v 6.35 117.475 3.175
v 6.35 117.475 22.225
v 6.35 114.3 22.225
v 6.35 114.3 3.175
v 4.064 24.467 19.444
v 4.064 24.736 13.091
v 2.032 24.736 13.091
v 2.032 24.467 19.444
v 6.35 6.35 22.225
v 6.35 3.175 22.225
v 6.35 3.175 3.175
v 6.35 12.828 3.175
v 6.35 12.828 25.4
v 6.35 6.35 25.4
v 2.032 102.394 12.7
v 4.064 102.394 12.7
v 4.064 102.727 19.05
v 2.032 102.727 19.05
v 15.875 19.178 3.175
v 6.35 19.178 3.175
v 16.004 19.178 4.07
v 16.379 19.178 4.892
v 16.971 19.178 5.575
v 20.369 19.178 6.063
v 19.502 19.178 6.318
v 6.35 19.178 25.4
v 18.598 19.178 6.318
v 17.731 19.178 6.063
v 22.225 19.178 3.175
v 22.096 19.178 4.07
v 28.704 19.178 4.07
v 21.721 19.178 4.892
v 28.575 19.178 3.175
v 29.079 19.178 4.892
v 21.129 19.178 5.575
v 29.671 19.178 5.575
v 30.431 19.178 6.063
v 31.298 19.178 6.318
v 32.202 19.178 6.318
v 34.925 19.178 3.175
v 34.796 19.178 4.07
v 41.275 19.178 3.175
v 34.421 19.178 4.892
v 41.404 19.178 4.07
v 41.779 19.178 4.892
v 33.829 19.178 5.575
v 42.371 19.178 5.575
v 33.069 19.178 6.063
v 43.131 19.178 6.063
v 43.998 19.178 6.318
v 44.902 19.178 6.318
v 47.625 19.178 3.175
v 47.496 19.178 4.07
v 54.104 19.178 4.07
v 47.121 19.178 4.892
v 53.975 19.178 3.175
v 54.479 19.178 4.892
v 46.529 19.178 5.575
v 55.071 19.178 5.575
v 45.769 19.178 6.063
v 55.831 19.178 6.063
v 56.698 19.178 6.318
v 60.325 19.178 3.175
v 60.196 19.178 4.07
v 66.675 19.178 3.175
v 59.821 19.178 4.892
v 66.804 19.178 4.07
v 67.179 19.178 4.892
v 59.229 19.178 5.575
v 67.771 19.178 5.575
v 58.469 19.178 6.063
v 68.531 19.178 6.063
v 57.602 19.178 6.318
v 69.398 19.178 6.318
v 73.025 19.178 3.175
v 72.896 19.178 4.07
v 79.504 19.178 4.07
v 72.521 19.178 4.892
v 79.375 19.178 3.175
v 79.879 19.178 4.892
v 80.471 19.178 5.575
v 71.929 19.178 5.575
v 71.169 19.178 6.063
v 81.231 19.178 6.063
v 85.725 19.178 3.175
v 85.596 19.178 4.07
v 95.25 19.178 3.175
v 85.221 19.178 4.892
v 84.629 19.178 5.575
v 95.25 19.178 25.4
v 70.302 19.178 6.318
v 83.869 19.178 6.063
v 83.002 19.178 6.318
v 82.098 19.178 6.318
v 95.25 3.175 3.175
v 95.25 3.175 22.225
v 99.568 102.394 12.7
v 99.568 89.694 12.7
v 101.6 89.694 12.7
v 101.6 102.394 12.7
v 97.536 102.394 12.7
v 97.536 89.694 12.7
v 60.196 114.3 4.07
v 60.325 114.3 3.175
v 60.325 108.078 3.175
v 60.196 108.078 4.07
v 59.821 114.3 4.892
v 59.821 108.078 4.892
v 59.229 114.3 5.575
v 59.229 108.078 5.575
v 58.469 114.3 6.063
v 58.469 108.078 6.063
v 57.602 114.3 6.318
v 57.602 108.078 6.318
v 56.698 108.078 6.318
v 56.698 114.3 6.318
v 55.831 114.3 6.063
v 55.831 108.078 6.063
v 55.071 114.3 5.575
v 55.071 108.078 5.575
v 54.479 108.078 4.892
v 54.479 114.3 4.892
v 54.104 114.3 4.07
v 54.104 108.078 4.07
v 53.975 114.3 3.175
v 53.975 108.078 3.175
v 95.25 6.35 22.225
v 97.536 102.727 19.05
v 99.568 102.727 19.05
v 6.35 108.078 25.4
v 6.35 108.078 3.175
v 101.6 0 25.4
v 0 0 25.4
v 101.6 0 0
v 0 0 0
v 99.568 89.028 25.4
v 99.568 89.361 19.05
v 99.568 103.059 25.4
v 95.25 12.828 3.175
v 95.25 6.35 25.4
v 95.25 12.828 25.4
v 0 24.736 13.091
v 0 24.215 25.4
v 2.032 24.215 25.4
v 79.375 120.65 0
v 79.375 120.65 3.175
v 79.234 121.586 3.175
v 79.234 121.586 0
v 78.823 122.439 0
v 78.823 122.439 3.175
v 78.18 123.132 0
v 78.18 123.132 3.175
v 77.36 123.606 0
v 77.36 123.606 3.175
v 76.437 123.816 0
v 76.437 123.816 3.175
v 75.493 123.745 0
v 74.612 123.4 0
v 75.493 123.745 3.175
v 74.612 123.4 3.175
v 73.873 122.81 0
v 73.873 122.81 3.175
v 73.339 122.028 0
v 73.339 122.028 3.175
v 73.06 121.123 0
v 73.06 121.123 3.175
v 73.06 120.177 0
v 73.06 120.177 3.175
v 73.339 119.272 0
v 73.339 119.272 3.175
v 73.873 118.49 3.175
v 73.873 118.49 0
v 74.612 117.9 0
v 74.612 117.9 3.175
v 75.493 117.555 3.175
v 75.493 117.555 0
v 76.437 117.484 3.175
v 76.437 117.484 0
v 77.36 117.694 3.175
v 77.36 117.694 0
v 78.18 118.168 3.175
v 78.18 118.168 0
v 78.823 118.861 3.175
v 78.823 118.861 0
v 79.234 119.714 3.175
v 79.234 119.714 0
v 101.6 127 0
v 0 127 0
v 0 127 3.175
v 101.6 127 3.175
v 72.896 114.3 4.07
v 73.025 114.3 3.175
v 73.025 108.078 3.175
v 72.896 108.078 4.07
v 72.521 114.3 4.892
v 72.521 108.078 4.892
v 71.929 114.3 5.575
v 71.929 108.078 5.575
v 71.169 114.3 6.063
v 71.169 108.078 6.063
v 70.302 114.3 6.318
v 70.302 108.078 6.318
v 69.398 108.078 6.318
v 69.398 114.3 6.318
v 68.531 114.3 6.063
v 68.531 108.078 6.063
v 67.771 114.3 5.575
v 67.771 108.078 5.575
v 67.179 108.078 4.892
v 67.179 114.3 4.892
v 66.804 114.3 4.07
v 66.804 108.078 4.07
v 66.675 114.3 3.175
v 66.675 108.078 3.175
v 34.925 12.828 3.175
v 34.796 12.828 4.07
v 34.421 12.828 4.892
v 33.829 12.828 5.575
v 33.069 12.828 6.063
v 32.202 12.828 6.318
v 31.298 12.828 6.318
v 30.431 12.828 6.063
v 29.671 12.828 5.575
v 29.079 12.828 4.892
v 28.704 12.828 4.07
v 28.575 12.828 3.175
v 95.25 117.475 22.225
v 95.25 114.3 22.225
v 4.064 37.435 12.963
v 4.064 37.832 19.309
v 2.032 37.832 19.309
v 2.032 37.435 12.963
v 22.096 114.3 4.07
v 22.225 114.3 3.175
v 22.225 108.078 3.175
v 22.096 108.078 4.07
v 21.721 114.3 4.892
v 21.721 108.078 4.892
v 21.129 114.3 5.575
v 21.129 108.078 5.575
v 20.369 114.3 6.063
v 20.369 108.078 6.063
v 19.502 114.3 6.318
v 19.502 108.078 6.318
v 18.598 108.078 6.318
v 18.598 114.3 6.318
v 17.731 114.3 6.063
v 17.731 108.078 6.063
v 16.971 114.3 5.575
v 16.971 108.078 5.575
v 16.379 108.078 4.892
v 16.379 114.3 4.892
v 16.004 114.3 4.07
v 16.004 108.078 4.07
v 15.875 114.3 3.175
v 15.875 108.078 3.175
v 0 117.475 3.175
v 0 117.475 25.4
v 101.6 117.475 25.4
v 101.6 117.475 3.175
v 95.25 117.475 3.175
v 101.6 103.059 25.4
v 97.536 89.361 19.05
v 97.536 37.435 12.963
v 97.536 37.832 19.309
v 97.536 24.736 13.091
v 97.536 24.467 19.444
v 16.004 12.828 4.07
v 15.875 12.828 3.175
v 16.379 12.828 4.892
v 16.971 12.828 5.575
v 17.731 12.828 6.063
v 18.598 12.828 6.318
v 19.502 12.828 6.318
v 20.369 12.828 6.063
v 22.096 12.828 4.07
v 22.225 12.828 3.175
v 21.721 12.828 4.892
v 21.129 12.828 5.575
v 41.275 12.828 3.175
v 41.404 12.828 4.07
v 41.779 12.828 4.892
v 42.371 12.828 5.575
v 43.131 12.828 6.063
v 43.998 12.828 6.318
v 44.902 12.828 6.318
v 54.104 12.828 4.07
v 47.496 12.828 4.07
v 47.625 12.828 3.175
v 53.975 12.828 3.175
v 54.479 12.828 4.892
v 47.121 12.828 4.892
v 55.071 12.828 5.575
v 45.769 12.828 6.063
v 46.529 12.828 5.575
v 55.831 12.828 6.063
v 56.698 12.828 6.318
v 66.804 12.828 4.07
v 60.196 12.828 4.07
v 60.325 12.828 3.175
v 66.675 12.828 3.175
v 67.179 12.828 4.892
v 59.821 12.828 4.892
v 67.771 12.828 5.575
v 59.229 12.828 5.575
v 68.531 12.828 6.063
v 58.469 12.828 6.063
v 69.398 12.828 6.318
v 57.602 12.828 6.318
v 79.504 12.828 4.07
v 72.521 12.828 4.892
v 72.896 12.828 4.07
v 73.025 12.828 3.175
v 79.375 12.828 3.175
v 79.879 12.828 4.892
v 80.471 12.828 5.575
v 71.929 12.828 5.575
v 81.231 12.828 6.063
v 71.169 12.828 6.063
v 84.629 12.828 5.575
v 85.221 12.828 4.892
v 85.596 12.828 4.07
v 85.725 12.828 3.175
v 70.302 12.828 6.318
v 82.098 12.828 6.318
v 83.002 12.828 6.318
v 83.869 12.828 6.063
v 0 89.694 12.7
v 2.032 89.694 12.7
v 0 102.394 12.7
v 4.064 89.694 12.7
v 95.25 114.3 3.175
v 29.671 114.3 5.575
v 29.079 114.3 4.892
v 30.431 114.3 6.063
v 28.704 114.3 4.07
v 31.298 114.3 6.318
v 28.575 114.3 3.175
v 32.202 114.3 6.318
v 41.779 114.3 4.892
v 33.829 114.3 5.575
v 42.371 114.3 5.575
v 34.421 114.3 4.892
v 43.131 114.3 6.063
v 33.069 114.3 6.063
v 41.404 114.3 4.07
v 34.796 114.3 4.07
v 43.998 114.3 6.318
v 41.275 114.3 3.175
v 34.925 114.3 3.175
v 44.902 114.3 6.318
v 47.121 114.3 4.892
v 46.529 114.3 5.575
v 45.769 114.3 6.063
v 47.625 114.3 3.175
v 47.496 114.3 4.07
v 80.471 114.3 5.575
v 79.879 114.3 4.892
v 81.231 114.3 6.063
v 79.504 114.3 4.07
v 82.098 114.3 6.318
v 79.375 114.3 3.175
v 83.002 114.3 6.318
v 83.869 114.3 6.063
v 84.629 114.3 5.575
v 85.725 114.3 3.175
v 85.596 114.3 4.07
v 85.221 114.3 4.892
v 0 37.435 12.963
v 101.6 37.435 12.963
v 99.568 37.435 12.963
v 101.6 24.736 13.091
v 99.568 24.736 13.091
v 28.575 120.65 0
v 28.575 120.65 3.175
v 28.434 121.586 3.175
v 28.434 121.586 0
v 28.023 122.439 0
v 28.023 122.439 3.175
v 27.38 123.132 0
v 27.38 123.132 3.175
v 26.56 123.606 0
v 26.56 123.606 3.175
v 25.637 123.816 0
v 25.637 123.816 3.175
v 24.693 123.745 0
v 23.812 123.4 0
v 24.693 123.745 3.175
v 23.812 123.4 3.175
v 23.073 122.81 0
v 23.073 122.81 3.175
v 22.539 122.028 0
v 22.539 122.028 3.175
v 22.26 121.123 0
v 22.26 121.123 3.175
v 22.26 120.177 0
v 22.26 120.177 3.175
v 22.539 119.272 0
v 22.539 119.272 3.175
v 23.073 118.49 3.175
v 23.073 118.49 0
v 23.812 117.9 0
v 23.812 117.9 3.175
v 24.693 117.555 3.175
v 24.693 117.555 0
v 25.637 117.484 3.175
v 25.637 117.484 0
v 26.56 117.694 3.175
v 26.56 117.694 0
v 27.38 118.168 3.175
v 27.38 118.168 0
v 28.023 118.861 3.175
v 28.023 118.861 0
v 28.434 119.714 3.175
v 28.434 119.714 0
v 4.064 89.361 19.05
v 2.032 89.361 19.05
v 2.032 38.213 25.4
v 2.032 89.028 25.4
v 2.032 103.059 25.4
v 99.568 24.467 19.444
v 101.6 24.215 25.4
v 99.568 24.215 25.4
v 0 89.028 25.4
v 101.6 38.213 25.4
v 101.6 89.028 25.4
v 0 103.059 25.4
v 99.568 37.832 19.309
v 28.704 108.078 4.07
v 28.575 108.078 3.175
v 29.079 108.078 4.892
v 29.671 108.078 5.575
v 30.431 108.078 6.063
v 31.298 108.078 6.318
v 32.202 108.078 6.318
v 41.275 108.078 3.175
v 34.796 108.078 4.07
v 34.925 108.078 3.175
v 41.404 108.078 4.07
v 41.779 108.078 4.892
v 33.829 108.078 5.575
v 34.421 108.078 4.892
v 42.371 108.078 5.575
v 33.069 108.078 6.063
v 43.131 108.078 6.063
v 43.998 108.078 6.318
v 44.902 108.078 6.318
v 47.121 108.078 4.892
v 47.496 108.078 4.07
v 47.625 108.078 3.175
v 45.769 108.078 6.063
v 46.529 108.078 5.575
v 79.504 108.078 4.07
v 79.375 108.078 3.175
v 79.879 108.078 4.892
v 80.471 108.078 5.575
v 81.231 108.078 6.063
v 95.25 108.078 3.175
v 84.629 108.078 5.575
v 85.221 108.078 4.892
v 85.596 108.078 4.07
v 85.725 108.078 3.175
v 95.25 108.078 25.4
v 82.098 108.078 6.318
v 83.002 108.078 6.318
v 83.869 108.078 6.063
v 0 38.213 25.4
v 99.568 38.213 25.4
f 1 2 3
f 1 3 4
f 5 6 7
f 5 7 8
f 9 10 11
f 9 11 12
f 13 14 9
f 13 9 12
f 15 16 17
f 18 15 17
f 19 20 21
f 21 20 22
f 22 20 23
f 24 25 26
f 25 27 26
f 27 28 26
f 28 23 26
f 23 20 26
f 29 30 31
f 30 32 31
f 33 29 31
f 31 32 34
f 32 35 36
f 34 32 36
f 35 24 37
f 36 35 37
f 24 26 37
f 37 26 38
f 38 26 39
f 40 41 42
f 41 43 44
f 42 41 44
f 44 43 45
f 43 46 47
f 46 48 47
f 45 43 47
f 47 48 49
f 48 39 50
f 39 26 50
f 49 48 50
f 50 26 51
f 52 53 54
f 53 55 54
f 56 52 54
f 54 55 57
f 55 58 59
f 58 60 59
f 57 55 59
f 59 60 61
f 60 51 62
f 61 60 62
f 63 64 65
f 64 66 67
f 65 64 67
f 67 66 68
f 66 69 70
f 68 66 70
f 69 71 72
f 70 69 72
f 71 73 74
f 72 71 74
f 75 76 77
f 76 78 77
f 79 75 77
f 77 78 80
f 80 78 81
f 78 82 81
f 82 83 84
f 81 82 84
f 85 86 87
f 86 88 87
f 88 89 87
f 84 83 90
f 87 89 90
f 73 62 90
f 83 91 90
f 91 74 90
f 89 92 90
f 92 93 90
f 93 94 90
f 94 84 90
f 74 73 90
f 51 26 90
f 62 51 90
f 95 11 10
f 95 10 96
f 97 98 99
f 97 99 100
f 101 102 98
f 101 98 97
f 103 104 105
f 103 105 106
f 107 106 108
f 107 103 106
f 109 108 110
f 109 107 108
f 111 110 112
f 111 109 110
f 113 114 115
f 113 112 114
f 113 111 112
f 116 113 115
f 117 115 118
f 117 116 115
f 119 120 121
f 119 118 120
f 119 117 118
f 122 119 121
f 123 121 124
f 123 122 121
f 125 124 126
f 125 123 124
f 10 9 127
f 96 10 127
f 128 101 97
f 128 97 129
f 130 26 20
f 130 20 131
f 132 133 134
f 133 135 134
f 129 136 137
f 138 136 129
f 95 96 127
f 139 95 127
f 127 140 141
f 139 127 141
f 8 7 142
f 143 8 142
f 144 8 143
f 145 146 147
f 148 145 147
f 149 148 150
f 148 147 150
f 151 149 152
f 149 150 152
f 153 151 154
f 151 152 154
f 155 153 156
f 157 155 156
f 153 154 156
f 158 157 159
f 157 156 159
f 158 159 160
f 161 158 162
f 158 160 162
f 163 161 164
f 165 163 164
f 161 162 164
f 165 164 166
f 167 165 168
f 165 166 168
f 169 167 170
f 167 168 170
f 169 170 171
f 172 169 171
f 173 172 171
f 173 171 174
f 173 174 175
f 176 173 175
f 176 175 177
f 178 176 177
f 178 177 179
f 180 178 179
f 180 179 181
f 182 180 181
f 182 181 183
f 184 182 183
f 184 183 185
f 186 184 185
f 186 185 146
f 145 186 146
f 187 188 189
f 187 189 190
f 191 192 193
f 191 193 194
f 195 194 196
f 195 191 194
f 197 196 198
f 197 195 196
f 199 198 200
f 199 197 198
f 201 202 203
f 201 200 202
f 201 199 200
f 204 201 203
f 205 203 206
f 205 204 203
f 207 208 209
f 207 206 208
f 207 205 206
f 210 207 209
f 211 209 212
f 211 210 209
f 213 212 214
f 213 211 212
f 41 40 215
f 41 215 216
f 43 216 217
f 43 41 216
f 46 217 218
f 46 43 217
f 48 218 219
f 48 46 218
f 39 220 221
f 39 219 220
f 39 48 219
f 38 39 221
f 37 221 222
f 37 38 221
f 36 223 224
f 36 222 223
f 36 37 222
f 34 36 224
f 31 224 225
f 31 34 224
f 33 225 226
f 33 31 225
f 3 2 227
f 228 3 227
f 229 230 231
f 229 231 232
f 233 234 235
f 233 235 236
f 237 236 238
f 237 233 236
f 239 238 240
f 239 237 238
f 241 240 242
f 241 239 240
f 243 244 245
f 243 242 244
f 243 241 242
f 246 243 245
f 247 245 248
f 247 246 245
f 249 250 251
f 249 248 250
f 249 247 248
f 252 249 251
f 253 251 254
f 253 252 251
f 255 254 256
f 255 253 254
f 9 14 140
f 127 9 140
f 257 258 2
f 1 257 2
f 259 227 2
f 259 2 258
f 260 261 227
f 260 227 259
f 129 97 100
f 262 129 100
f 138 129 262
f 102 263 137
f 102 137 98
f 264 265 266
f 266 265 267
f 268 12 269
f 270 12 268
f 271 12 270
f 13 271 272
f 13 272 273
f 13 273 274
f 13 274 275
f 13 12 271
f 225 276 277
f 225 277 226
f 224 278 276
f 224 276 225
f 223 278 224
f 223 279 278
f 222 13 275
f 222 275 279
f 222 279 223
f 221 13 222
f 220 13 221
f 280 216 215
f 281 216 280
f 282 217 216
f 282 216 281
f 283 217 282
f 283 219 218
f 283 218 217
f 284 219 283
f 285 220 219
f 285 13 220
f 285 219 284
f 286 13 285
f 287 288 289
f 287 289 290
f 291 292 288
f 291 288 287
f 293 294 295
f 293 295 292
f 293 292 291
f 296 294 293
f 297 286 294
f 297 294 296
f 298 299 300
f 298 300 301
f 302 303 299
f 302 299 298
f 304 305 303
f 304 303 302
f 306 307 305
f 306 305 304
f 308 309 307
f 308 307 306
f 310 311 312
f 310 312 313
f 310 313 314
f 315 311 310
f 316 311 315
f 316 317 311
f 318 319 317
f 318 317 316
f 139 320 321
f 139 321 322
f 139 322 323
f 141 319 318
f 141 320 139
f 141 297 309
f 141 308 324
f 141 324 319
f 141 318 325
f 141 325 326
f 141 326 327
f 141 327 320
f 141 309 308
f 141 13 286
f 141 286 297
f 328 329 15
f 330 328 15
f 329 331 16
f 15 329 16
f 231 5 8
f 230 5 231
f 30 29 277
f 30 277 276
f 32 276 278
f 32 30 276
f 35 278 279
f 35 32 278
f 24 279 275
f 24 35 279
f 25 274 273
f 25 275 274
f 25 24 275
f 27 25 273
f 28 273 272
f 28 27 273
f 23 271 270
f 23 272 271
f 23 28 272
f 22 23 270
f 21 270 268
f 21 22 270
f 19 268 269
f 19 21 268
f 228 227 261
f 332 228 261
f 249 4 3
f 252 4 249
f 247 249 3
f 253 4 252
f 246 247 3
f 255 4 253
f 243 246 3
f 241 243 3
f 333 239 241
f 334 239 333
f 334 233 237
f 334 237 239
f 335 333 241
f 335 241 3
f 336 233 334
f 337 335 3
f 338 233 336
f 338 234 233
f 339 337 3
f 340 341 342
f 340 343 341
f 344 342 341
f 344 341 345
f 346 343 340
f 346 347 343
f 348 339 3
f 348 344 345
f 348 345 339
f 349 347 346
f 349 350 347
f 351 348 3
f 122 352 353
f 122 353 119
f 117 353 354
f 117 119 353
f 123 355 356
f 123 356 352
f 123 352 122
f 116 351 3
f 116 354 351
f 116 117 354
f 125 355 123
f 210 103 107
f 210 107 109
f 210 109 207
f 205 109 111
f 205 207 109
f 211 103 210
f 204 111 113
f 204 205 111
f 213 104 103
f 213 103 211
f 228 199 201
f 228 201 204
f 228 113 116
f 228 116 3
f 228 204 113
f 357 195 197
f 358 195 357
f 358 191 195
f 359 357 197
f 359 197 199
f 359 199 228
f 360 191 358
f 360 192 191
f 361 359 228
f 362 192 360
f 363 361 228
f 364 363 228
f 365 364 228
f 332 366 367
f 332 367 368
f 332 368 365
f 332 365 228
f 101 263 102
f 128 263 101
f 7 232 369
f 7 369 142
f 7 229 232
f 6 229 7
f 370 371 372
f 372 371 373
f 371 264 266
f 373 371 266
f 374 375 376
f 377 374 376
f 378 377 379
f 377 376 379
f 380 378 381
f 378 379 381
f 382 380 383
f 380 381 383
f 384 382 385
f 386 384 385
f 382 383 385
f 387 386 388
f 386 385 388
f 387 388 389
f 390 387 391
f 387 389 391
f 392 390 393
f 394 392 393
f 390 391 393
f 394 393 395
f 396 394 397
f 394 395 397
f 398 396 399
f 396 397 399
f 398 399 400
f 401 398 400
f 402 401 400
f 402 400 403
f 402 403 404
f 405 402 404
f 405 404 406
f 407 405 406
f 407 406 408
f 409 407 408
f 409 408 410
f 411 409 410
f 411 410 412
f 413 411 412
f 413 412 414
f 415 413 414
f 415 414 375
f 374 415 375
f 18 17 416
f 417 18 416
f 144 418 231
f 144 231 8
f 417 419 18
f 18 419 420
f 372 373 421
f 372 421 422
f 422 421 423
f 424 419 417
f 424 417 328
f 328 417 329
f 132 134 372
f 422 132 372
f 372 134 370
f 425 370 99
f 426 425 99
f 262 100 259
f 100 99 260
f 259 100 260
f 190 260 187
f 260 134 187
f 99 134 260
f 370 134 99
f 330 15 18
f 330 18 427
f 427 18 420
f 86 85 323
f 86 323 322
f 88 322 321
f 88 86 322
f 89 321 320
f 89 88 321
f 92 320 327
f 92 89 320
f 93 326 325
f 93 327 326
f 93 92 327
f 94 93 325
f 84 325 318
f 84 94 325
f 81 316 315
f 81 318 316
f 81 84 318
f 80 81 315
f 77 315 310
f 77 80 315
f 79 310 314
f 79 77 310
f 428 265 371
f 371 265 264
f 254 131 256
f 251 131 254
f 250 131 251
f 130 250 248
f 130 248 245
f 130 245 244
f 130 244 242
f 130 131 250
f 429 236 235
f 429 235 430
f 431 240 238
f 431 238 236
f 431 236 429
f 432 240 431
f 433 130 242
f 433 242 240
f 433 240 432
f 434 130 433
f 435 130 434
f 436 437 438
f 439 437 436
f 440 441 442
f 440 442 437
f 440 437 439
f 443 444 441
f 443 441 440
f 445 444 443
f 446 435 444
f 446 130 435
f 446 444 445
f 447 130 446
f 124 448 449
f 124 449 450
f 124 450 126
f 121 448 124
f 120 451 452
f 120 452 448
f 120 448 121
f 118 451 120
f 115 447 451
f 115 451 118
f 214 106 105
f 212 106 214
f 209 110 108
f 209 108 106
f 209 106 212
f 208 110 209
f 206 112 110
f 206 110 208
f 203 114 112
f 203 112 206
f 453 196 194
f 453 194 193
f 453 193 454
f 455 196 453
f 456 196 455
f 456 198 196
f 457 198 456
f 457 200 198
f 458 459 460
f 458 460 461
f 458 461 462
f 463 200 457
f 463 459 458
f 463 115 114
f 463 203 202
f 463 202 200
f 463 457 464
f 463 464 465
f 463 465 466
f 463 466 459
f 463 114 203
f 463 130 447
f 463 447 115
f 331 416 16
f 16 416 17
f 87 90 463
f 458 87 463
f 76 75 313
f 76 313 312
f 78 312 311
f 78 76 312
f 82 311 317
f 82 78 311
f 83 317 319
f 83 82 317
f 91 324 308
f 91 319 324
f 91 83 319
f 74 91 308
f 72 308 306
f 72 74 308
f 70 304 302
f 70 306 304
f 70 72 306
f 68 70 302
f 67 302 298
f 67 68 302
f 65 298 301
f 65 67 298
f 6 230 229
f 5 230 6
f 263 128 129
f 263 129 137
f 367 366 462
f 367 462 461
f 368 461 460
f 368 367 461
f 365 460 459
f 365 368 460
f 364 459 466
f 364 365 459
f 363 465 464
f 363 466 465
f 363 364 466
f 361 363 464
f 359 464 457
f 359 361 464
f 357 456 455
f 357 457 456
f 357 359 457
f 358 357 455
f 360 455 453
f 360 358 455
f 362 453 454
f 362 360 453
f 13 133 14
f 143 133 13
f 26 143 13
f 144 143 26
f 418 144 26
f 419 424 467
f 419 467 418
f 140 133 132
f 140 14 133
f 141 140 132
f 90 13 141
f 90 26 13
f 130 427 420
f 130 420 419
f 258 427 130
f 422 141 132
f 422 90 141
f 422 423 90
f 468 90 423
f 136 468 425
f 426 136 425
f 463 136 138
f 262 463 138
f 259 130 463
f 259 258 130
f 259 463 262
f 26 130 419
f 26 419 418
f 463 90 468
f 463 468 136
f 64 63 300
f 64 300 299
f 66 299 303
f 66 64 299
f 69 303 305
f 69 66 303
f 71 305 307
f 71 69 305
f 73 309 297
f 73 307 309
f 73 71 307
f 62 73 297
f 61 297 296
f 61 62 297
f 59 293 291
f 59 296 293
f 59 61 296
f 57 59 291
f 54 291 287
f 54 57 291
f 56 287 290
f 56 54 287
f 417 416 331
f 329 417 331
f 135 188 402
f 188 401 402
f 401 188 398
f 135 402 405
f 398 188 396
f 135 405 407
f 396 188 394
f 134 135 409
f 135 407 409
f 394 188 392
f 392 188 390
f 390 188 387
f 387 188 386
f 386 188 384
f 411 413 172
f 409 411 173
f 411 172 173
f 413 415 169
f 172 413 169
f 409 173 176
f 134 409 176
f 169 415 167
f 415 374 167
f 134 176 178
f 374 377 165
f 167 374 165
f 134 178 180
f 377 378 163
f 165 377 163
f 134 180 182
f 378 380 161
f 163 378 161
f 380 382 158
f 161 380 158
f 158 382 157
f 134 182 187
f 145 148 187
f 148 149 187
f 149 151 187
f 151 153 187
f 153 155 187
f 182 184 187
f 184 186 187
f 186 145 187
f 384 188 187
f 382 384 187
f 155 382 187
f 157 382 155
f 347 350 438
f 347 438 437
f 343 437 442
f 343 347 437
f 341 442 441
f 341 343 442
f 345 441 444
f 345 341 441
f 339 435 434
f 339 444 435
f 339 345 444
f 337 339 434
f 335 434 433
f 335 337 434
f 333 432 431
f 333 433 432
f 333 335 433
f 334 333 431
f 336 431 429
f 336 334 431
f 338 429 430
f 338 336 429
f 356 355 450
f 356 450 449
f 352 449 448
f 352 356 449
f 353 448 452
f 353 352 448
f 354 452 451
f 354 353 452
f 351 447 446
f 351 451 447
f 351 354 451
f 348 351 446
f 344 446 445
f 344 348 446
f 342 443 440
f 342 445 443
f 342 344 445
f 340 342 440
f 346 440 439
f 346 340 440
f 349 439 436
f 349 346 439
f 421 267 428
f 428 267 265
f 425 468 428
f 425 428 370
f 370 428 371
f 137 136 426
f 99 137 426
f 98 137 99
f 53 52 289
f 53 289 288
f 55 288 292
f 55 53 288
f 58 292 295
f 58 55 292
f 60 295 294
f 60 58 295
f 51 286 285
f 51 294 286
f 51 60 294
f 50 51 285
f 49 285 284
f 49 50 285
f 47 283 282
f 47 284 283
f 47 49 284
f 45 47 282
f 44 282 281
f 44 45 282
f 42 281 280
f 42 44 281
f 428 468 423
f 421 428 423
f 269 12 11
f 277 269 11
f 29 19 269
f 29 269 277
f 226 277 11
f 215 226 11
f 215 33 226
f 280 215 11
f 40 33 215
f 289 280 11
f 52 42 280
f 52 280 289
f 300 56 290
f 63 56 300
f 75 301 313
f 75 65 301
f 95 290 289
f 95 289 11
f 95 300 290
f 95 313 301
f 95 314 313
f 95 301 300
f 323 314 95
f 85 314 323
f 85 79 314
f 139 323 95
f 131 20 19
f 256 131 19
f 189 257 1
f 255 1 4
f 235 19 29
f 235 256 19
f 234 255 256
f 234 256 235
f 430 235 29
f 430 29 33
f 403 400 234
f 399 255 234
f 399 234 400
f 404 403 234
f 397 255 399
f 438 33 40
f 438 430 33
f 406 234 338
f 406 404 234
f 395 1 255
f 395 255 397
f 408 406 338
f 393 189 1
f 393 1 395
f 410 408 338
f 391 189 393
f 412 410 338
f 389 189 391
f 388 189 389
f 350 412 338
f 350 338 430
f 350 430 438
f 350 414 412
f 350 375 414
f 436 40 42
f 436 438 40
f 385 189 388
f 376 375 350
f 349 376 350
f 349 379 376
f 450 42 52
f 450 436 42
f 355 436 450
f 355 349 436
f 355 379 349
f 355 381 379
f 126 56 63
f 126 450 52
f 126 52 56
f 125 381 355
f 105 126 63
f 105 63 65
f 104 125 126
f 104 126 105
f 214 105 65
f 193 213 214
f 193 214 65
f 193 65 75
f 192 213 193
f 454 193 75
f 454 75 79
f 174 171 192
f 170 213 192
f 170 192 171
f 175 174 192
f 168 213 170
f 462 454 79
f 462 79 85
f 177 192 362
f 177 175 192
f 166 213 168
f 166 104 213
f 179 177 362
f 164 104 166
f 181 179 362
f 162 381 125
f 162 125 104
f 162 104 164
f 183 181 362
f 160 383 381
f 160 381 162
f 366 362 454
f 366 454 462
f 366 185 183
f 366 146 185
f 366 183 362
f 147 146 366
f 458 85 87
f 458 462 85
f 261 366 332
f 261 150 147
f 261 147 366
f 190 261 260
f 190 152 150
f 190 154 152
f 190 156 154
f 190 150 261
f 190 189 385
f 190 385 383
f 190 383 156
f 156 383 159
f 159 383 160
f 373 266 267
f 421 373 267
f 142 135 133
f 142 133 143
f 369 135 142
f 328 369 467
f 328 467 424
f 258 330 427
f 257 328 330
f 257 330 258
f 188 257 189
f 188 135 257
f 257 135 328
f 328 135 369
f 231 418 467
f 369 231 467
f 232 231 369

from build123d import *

# Parameters (mm, degrees)
SKETCH1_W            = 101.6
SKETCH1_H            = 127
BOSS_EXTRUDE1_DEPTH  = 3.175
SKETCH2_W            = 101.6
SKETCH2_H            = 117.475
BOSS_EXTRUDE2_DEPTH  = 22.225
SKETCH3_W            = 88.9
SKETCH3_H            = 19.05
CUT_EXTRUDE1_DEPTH   = 3.175
SKETCH4_R            = 3.175
CUT_EXTRUDE2_DEPTH   = 165.150877625
SKETCH5_W            = 88.9
SKETCH5_H            = 6.477782688
CUT_EXTRUDE3_DEPTH   = 22.225
SKETCH6_W            = 88.9
SKETCH6_H            = 19.05
CUT_EXTRUDE4_DEPTH   = 3.175
SKETCH7_W            = 88.9
SKETCH7_H            = 88.9
CUT_EXTRUDE6_DEPTH   = 22.225
CUT_EXTRUDE7_DEPTH   = 7.62
LPATTERN1_COUNT      = 6
LPATTERN1_PITCH      = 12.7
SNAP_START           = 99.568
SNAP_GROOVE1_DEPTH   = 2.032
SNAP_START_2         = 97.536
SNAP_GROOVE1_2_DEPTH = 2.032
MIRROR2_START        = 99.568
MIRROR2_COPY_1_DEPTH = 2.032
MIRROR2_START_2      = 97.536
MIRROR2_COPY_2_DEPTH = 2.032
MIRROR2_COPY_3_DEPTH = 2.032
CUT_EXTRUDE8_REACH   = 157.023
LPATTERN2_COUNT      = 6
LPATTERN2_PITCH      = 12.7


# Read off the part's stored shape, not the designer's step: Snap Groove1
with BuildPart() as part:
    # Sketch1 → Boss-Extrude1 (new body)
    with BuildSketch(Plane.XY):
        with Locations((50.8, 63.5)):
            Rectangle(SKETCH1_W, SKETCH1_H)
    extrude(amount=BOSS_EXTRUDE1_DEPTH)

    # Sketch2 → Boss-Extrude2 (add)
    with BuildSketch(Plane.XY.offset(3.175)):
        with Locations((50.8, 58.7375)):
            Rectangle(SKETCH2_W, SKETCH2_H)
    extrude(amount=BOSS_EXTRUDE2_DEPTH)

    # Sketch3 → Cut-Extrude1 (cut)
    with BuildSketch(Plane(origin=(0, 117.475, 0), x_dir=(1, 0, 0), z_dir=(0, 1, 0))):
        with Locations((50.8, -12.7)):
            Rectangle(SKETCH3_W, SKETCH3_H)
    extrude(amount=-CUT_EXTRUDE1_DEPTH, mode=Mode.SUBTRACT)

    # Sketch4 → Cut-Extrude2 (cut, through all)
    with BuildSketch(Plane.XY.offset(3.175)):
        with Locations((25.4, 120.65)):
            Circle(SKETCH4_R)
        with Locations((76.2, 120.65)):
            Circle(SKETCH4_R)
    extrude(amount=-CUT_EXTRUDE2_DEPTH, mode=Mode.SUBTRACT)

    # Sketch5 → Cut-Extrude3 (cut)
    with BuildSketch(Plane.XY.offset(25.4)):
        with Locations((50.8, 9.588891344)):
            Rectangle(SKETCH5_W, SKETCH5_H)
    extrude(amount=-CUT_EXTRUDE3_DEPTH, mode=Mode.SUBTRACT)

    # Sketch6 → Cut-Extrude4 (cut)
    with BuildSketch(Plane(origin=(0, 6.35, 0), x_dir=(1, 0, 0), z_dir=(0, 1, 0))):
        with Locations((50.8, -12.7)):
            Rectangle(SKETCH6_W, SKETCH6_H)
    extrude(amount=-CUT_EXTRUDE4_DEPTH, mode=Mode.SUBTRACT)

    # Sketch7 → Cut-Extrude6 (cut)
    with BuildSketch(Plane.XY.offset(25.4)):
        with Locations((50.8, 63.627782688)):
            Rectangle(SKETCH7_W, SKETCH7_H)
    extrude(amount=-CUT_EXTRUDE6_DEPTH, mode=Mode.SUBTRACT)

    # Sketch9 → Cut-Extrude7 (cut)
    with BuildSketch(Plane(origin=(0, 19.177782688, 0), x_dir=(1, 0, 0), z_dir=(0, 1, 0))):
        with BuildLine():
            Line((15.875, -3.175), (22.225, -3.175))
            ThreePointArc((22.225, -3.175), (19.05, -6.35), (15.875, -3.175))
        make_face()
    cut_extrude7 = extrude(amount=-CUT_EXTRUDE7_DEPTH, mode=Mode.SUBTRACT)

    # LPattern1: Cut-Extrude7 ×6
    with Locations(*[(i * LPATTERN1_PITCH, 0, 0) for i in range(1, LPATTERN1_COUNT)]):
        add(cut_extrude7, mode=Mode.SUBTRACT)

    # Snap Groove1 outline → Snap Groove1 (cut)
    with BuildSketch(Plane.YZ.offset(SNAP_START)):
        Polygon((102.39375, 12.7), (103.059328797, 25.4), (89.028171203, 25.4), (89.69375, 12.7), align=None)
    snap_groove1 = extrude(amount=SNAP_GROOVE1_DEPTH, mode=Mode.SUBTRACT)

    # Snap Groove1 2 outline → Snap Groove1 2 (cut)
    with BuildSketch(Plane.YZ.offset(SNAP_START_2)):
        Polygon((102.39375, 12.7), (102.726539398, 19.05), (89.360960602, 19.05), (89.69375, 12.7), align=None)
    snap_groove1_2 = extrude(amount=SNAP_GROOVE1_2_DEPTH, mode=Mode.SUBTRACT)

    # Mirror1: Snap Groove1, Snap Groove1 2 across plane
    add(snap_groove1.mirror(Plane(origin=(50.8, 0, 0), x_dir=(0, 0, 1), z_dir=(1, 0, 0))), mode=Mode.SUBTRACT)
    add(snap_groove1_2.mirror(Plane(origin=(50.8, 0, 0), x_dir=(0, 0, 1), z_dir=(1, 0, 0))), mode=Mode.SUBTRACT)

    # Mirror2: Snap Groove1, Snap Groove1 2 across plane
    add(snap_groove1.mirror(Plane(origin=(0, 63.498392913, -0.319448634), x_dir=(0, 0.005030750815786494, 0.999987345693049), z_dir=(0, -0.9999873456930491, 0.0050307508157864935))), mode=Mode.SUBTRACT)
    add(snap_groove1_2.mirror(Plane(origin=(0, 63.498392913, -0.319448634), x_dir=(0, 0.005030750815786494, 0.999987345693049), z_dir=(0, -0.9999873456930491, 0.0050307508157864935))), mode=Mode.SUBTRACT)

    # Mirror2 copy 1 sketch → Mirror2 copy 1 (cut)
    with BuildSketch(Plane(origin=(101.6, 126.996785826, -0.638897269), x_dir=(0, -0.9999493830924595, 0.010061374310242954), z_dir=(-1, 0, 0)).offset(MIRROR2_START)):
        Polygon((102.39375, 12.7), (103.059328797, 25.4), (89.028171203, 25.4), (89.69375, 12.7), align=None)
    extrude(amount=MIRROR2_COPY_1_DEPTH, mode=Mode.SUBTRACT)

    # Mirror2 copy 2 sketch → Mirror2 copy 2 (cut)
    with BuildSketch(Plane(origin=(101.6, 126.996785826, -0.638897269), x_dir=(0, -0.9999493830924595, 0.010061374310242954), z_dir=(-1, 0, 0)).offset(MIRROR2_START_2)):
        Polygon((102.39375, 12.7), (102.726539398, 19.05), (89.360960602, 19.05), (89.69375, 12.7), align=None)
    extrude(amount=MIRROR2_COPY_2_DEPTH, mode=Mode.SUBTRACT)

    # Mirror2 copy 3 sketch → Mirror2 copy 3 (cut)
    with BuildSketch(Plane(origin=(0, 126.996785826, -0.638897269), x_dir=(0, -0.9999493830924595, 0.010061374310242954), z_dir=(1, 0, 0)).offset(MIRROR2_START_2)):
        Polygon((102.39375, -12.7), (102.726539398, -19.05), (89.360960602, -19.05), (89.69375, -12.7), align=None)
    extrude(amount=MIRROR2_COPY_3_DEPTH, mode=Mode.SUBTRACT)

    # Sketch11 → Cut-Extrude8 (cut, up to next)
    with BuildSketch(Plane(origin=(0, 114.3, 0), x_dir=(1, 0, 0), z_dir=(0, 1, 0)), mode=Mode.PRIVATE) as cut_extrude8_sk1:
        with BuildLine():
            Line((15.875, -3.175), (22.225, -3.175))
            ThreePointArc((22.225, -3.175), (19.05, -6.35), (15.875, -3.175))
        make_face()
    cut_extrude8_tool1 = extrude(cut_extrude8_sk1.sketch, amount=-CUT_EXTRUDE8_REACH, mode=Mode.PRIVATE) & part.part
    cut_extrude8 = cut_extrude8_tool1.solids().sort_by_distance((19.05, 114.3, 4.522512))[0]
    add(cut_extrude8, mode=Mode.SUBTRACT)

    # LPattern2: Cut-Extrude8 ×6
    with Locations(*[(i * LPATTERN2_PITCH, 0, 0) for i in range(1, LPATTERN2_COUNT)]):
        add(cut_extrude8, mode=Mode.SUBTRACT)


solid = part.part
